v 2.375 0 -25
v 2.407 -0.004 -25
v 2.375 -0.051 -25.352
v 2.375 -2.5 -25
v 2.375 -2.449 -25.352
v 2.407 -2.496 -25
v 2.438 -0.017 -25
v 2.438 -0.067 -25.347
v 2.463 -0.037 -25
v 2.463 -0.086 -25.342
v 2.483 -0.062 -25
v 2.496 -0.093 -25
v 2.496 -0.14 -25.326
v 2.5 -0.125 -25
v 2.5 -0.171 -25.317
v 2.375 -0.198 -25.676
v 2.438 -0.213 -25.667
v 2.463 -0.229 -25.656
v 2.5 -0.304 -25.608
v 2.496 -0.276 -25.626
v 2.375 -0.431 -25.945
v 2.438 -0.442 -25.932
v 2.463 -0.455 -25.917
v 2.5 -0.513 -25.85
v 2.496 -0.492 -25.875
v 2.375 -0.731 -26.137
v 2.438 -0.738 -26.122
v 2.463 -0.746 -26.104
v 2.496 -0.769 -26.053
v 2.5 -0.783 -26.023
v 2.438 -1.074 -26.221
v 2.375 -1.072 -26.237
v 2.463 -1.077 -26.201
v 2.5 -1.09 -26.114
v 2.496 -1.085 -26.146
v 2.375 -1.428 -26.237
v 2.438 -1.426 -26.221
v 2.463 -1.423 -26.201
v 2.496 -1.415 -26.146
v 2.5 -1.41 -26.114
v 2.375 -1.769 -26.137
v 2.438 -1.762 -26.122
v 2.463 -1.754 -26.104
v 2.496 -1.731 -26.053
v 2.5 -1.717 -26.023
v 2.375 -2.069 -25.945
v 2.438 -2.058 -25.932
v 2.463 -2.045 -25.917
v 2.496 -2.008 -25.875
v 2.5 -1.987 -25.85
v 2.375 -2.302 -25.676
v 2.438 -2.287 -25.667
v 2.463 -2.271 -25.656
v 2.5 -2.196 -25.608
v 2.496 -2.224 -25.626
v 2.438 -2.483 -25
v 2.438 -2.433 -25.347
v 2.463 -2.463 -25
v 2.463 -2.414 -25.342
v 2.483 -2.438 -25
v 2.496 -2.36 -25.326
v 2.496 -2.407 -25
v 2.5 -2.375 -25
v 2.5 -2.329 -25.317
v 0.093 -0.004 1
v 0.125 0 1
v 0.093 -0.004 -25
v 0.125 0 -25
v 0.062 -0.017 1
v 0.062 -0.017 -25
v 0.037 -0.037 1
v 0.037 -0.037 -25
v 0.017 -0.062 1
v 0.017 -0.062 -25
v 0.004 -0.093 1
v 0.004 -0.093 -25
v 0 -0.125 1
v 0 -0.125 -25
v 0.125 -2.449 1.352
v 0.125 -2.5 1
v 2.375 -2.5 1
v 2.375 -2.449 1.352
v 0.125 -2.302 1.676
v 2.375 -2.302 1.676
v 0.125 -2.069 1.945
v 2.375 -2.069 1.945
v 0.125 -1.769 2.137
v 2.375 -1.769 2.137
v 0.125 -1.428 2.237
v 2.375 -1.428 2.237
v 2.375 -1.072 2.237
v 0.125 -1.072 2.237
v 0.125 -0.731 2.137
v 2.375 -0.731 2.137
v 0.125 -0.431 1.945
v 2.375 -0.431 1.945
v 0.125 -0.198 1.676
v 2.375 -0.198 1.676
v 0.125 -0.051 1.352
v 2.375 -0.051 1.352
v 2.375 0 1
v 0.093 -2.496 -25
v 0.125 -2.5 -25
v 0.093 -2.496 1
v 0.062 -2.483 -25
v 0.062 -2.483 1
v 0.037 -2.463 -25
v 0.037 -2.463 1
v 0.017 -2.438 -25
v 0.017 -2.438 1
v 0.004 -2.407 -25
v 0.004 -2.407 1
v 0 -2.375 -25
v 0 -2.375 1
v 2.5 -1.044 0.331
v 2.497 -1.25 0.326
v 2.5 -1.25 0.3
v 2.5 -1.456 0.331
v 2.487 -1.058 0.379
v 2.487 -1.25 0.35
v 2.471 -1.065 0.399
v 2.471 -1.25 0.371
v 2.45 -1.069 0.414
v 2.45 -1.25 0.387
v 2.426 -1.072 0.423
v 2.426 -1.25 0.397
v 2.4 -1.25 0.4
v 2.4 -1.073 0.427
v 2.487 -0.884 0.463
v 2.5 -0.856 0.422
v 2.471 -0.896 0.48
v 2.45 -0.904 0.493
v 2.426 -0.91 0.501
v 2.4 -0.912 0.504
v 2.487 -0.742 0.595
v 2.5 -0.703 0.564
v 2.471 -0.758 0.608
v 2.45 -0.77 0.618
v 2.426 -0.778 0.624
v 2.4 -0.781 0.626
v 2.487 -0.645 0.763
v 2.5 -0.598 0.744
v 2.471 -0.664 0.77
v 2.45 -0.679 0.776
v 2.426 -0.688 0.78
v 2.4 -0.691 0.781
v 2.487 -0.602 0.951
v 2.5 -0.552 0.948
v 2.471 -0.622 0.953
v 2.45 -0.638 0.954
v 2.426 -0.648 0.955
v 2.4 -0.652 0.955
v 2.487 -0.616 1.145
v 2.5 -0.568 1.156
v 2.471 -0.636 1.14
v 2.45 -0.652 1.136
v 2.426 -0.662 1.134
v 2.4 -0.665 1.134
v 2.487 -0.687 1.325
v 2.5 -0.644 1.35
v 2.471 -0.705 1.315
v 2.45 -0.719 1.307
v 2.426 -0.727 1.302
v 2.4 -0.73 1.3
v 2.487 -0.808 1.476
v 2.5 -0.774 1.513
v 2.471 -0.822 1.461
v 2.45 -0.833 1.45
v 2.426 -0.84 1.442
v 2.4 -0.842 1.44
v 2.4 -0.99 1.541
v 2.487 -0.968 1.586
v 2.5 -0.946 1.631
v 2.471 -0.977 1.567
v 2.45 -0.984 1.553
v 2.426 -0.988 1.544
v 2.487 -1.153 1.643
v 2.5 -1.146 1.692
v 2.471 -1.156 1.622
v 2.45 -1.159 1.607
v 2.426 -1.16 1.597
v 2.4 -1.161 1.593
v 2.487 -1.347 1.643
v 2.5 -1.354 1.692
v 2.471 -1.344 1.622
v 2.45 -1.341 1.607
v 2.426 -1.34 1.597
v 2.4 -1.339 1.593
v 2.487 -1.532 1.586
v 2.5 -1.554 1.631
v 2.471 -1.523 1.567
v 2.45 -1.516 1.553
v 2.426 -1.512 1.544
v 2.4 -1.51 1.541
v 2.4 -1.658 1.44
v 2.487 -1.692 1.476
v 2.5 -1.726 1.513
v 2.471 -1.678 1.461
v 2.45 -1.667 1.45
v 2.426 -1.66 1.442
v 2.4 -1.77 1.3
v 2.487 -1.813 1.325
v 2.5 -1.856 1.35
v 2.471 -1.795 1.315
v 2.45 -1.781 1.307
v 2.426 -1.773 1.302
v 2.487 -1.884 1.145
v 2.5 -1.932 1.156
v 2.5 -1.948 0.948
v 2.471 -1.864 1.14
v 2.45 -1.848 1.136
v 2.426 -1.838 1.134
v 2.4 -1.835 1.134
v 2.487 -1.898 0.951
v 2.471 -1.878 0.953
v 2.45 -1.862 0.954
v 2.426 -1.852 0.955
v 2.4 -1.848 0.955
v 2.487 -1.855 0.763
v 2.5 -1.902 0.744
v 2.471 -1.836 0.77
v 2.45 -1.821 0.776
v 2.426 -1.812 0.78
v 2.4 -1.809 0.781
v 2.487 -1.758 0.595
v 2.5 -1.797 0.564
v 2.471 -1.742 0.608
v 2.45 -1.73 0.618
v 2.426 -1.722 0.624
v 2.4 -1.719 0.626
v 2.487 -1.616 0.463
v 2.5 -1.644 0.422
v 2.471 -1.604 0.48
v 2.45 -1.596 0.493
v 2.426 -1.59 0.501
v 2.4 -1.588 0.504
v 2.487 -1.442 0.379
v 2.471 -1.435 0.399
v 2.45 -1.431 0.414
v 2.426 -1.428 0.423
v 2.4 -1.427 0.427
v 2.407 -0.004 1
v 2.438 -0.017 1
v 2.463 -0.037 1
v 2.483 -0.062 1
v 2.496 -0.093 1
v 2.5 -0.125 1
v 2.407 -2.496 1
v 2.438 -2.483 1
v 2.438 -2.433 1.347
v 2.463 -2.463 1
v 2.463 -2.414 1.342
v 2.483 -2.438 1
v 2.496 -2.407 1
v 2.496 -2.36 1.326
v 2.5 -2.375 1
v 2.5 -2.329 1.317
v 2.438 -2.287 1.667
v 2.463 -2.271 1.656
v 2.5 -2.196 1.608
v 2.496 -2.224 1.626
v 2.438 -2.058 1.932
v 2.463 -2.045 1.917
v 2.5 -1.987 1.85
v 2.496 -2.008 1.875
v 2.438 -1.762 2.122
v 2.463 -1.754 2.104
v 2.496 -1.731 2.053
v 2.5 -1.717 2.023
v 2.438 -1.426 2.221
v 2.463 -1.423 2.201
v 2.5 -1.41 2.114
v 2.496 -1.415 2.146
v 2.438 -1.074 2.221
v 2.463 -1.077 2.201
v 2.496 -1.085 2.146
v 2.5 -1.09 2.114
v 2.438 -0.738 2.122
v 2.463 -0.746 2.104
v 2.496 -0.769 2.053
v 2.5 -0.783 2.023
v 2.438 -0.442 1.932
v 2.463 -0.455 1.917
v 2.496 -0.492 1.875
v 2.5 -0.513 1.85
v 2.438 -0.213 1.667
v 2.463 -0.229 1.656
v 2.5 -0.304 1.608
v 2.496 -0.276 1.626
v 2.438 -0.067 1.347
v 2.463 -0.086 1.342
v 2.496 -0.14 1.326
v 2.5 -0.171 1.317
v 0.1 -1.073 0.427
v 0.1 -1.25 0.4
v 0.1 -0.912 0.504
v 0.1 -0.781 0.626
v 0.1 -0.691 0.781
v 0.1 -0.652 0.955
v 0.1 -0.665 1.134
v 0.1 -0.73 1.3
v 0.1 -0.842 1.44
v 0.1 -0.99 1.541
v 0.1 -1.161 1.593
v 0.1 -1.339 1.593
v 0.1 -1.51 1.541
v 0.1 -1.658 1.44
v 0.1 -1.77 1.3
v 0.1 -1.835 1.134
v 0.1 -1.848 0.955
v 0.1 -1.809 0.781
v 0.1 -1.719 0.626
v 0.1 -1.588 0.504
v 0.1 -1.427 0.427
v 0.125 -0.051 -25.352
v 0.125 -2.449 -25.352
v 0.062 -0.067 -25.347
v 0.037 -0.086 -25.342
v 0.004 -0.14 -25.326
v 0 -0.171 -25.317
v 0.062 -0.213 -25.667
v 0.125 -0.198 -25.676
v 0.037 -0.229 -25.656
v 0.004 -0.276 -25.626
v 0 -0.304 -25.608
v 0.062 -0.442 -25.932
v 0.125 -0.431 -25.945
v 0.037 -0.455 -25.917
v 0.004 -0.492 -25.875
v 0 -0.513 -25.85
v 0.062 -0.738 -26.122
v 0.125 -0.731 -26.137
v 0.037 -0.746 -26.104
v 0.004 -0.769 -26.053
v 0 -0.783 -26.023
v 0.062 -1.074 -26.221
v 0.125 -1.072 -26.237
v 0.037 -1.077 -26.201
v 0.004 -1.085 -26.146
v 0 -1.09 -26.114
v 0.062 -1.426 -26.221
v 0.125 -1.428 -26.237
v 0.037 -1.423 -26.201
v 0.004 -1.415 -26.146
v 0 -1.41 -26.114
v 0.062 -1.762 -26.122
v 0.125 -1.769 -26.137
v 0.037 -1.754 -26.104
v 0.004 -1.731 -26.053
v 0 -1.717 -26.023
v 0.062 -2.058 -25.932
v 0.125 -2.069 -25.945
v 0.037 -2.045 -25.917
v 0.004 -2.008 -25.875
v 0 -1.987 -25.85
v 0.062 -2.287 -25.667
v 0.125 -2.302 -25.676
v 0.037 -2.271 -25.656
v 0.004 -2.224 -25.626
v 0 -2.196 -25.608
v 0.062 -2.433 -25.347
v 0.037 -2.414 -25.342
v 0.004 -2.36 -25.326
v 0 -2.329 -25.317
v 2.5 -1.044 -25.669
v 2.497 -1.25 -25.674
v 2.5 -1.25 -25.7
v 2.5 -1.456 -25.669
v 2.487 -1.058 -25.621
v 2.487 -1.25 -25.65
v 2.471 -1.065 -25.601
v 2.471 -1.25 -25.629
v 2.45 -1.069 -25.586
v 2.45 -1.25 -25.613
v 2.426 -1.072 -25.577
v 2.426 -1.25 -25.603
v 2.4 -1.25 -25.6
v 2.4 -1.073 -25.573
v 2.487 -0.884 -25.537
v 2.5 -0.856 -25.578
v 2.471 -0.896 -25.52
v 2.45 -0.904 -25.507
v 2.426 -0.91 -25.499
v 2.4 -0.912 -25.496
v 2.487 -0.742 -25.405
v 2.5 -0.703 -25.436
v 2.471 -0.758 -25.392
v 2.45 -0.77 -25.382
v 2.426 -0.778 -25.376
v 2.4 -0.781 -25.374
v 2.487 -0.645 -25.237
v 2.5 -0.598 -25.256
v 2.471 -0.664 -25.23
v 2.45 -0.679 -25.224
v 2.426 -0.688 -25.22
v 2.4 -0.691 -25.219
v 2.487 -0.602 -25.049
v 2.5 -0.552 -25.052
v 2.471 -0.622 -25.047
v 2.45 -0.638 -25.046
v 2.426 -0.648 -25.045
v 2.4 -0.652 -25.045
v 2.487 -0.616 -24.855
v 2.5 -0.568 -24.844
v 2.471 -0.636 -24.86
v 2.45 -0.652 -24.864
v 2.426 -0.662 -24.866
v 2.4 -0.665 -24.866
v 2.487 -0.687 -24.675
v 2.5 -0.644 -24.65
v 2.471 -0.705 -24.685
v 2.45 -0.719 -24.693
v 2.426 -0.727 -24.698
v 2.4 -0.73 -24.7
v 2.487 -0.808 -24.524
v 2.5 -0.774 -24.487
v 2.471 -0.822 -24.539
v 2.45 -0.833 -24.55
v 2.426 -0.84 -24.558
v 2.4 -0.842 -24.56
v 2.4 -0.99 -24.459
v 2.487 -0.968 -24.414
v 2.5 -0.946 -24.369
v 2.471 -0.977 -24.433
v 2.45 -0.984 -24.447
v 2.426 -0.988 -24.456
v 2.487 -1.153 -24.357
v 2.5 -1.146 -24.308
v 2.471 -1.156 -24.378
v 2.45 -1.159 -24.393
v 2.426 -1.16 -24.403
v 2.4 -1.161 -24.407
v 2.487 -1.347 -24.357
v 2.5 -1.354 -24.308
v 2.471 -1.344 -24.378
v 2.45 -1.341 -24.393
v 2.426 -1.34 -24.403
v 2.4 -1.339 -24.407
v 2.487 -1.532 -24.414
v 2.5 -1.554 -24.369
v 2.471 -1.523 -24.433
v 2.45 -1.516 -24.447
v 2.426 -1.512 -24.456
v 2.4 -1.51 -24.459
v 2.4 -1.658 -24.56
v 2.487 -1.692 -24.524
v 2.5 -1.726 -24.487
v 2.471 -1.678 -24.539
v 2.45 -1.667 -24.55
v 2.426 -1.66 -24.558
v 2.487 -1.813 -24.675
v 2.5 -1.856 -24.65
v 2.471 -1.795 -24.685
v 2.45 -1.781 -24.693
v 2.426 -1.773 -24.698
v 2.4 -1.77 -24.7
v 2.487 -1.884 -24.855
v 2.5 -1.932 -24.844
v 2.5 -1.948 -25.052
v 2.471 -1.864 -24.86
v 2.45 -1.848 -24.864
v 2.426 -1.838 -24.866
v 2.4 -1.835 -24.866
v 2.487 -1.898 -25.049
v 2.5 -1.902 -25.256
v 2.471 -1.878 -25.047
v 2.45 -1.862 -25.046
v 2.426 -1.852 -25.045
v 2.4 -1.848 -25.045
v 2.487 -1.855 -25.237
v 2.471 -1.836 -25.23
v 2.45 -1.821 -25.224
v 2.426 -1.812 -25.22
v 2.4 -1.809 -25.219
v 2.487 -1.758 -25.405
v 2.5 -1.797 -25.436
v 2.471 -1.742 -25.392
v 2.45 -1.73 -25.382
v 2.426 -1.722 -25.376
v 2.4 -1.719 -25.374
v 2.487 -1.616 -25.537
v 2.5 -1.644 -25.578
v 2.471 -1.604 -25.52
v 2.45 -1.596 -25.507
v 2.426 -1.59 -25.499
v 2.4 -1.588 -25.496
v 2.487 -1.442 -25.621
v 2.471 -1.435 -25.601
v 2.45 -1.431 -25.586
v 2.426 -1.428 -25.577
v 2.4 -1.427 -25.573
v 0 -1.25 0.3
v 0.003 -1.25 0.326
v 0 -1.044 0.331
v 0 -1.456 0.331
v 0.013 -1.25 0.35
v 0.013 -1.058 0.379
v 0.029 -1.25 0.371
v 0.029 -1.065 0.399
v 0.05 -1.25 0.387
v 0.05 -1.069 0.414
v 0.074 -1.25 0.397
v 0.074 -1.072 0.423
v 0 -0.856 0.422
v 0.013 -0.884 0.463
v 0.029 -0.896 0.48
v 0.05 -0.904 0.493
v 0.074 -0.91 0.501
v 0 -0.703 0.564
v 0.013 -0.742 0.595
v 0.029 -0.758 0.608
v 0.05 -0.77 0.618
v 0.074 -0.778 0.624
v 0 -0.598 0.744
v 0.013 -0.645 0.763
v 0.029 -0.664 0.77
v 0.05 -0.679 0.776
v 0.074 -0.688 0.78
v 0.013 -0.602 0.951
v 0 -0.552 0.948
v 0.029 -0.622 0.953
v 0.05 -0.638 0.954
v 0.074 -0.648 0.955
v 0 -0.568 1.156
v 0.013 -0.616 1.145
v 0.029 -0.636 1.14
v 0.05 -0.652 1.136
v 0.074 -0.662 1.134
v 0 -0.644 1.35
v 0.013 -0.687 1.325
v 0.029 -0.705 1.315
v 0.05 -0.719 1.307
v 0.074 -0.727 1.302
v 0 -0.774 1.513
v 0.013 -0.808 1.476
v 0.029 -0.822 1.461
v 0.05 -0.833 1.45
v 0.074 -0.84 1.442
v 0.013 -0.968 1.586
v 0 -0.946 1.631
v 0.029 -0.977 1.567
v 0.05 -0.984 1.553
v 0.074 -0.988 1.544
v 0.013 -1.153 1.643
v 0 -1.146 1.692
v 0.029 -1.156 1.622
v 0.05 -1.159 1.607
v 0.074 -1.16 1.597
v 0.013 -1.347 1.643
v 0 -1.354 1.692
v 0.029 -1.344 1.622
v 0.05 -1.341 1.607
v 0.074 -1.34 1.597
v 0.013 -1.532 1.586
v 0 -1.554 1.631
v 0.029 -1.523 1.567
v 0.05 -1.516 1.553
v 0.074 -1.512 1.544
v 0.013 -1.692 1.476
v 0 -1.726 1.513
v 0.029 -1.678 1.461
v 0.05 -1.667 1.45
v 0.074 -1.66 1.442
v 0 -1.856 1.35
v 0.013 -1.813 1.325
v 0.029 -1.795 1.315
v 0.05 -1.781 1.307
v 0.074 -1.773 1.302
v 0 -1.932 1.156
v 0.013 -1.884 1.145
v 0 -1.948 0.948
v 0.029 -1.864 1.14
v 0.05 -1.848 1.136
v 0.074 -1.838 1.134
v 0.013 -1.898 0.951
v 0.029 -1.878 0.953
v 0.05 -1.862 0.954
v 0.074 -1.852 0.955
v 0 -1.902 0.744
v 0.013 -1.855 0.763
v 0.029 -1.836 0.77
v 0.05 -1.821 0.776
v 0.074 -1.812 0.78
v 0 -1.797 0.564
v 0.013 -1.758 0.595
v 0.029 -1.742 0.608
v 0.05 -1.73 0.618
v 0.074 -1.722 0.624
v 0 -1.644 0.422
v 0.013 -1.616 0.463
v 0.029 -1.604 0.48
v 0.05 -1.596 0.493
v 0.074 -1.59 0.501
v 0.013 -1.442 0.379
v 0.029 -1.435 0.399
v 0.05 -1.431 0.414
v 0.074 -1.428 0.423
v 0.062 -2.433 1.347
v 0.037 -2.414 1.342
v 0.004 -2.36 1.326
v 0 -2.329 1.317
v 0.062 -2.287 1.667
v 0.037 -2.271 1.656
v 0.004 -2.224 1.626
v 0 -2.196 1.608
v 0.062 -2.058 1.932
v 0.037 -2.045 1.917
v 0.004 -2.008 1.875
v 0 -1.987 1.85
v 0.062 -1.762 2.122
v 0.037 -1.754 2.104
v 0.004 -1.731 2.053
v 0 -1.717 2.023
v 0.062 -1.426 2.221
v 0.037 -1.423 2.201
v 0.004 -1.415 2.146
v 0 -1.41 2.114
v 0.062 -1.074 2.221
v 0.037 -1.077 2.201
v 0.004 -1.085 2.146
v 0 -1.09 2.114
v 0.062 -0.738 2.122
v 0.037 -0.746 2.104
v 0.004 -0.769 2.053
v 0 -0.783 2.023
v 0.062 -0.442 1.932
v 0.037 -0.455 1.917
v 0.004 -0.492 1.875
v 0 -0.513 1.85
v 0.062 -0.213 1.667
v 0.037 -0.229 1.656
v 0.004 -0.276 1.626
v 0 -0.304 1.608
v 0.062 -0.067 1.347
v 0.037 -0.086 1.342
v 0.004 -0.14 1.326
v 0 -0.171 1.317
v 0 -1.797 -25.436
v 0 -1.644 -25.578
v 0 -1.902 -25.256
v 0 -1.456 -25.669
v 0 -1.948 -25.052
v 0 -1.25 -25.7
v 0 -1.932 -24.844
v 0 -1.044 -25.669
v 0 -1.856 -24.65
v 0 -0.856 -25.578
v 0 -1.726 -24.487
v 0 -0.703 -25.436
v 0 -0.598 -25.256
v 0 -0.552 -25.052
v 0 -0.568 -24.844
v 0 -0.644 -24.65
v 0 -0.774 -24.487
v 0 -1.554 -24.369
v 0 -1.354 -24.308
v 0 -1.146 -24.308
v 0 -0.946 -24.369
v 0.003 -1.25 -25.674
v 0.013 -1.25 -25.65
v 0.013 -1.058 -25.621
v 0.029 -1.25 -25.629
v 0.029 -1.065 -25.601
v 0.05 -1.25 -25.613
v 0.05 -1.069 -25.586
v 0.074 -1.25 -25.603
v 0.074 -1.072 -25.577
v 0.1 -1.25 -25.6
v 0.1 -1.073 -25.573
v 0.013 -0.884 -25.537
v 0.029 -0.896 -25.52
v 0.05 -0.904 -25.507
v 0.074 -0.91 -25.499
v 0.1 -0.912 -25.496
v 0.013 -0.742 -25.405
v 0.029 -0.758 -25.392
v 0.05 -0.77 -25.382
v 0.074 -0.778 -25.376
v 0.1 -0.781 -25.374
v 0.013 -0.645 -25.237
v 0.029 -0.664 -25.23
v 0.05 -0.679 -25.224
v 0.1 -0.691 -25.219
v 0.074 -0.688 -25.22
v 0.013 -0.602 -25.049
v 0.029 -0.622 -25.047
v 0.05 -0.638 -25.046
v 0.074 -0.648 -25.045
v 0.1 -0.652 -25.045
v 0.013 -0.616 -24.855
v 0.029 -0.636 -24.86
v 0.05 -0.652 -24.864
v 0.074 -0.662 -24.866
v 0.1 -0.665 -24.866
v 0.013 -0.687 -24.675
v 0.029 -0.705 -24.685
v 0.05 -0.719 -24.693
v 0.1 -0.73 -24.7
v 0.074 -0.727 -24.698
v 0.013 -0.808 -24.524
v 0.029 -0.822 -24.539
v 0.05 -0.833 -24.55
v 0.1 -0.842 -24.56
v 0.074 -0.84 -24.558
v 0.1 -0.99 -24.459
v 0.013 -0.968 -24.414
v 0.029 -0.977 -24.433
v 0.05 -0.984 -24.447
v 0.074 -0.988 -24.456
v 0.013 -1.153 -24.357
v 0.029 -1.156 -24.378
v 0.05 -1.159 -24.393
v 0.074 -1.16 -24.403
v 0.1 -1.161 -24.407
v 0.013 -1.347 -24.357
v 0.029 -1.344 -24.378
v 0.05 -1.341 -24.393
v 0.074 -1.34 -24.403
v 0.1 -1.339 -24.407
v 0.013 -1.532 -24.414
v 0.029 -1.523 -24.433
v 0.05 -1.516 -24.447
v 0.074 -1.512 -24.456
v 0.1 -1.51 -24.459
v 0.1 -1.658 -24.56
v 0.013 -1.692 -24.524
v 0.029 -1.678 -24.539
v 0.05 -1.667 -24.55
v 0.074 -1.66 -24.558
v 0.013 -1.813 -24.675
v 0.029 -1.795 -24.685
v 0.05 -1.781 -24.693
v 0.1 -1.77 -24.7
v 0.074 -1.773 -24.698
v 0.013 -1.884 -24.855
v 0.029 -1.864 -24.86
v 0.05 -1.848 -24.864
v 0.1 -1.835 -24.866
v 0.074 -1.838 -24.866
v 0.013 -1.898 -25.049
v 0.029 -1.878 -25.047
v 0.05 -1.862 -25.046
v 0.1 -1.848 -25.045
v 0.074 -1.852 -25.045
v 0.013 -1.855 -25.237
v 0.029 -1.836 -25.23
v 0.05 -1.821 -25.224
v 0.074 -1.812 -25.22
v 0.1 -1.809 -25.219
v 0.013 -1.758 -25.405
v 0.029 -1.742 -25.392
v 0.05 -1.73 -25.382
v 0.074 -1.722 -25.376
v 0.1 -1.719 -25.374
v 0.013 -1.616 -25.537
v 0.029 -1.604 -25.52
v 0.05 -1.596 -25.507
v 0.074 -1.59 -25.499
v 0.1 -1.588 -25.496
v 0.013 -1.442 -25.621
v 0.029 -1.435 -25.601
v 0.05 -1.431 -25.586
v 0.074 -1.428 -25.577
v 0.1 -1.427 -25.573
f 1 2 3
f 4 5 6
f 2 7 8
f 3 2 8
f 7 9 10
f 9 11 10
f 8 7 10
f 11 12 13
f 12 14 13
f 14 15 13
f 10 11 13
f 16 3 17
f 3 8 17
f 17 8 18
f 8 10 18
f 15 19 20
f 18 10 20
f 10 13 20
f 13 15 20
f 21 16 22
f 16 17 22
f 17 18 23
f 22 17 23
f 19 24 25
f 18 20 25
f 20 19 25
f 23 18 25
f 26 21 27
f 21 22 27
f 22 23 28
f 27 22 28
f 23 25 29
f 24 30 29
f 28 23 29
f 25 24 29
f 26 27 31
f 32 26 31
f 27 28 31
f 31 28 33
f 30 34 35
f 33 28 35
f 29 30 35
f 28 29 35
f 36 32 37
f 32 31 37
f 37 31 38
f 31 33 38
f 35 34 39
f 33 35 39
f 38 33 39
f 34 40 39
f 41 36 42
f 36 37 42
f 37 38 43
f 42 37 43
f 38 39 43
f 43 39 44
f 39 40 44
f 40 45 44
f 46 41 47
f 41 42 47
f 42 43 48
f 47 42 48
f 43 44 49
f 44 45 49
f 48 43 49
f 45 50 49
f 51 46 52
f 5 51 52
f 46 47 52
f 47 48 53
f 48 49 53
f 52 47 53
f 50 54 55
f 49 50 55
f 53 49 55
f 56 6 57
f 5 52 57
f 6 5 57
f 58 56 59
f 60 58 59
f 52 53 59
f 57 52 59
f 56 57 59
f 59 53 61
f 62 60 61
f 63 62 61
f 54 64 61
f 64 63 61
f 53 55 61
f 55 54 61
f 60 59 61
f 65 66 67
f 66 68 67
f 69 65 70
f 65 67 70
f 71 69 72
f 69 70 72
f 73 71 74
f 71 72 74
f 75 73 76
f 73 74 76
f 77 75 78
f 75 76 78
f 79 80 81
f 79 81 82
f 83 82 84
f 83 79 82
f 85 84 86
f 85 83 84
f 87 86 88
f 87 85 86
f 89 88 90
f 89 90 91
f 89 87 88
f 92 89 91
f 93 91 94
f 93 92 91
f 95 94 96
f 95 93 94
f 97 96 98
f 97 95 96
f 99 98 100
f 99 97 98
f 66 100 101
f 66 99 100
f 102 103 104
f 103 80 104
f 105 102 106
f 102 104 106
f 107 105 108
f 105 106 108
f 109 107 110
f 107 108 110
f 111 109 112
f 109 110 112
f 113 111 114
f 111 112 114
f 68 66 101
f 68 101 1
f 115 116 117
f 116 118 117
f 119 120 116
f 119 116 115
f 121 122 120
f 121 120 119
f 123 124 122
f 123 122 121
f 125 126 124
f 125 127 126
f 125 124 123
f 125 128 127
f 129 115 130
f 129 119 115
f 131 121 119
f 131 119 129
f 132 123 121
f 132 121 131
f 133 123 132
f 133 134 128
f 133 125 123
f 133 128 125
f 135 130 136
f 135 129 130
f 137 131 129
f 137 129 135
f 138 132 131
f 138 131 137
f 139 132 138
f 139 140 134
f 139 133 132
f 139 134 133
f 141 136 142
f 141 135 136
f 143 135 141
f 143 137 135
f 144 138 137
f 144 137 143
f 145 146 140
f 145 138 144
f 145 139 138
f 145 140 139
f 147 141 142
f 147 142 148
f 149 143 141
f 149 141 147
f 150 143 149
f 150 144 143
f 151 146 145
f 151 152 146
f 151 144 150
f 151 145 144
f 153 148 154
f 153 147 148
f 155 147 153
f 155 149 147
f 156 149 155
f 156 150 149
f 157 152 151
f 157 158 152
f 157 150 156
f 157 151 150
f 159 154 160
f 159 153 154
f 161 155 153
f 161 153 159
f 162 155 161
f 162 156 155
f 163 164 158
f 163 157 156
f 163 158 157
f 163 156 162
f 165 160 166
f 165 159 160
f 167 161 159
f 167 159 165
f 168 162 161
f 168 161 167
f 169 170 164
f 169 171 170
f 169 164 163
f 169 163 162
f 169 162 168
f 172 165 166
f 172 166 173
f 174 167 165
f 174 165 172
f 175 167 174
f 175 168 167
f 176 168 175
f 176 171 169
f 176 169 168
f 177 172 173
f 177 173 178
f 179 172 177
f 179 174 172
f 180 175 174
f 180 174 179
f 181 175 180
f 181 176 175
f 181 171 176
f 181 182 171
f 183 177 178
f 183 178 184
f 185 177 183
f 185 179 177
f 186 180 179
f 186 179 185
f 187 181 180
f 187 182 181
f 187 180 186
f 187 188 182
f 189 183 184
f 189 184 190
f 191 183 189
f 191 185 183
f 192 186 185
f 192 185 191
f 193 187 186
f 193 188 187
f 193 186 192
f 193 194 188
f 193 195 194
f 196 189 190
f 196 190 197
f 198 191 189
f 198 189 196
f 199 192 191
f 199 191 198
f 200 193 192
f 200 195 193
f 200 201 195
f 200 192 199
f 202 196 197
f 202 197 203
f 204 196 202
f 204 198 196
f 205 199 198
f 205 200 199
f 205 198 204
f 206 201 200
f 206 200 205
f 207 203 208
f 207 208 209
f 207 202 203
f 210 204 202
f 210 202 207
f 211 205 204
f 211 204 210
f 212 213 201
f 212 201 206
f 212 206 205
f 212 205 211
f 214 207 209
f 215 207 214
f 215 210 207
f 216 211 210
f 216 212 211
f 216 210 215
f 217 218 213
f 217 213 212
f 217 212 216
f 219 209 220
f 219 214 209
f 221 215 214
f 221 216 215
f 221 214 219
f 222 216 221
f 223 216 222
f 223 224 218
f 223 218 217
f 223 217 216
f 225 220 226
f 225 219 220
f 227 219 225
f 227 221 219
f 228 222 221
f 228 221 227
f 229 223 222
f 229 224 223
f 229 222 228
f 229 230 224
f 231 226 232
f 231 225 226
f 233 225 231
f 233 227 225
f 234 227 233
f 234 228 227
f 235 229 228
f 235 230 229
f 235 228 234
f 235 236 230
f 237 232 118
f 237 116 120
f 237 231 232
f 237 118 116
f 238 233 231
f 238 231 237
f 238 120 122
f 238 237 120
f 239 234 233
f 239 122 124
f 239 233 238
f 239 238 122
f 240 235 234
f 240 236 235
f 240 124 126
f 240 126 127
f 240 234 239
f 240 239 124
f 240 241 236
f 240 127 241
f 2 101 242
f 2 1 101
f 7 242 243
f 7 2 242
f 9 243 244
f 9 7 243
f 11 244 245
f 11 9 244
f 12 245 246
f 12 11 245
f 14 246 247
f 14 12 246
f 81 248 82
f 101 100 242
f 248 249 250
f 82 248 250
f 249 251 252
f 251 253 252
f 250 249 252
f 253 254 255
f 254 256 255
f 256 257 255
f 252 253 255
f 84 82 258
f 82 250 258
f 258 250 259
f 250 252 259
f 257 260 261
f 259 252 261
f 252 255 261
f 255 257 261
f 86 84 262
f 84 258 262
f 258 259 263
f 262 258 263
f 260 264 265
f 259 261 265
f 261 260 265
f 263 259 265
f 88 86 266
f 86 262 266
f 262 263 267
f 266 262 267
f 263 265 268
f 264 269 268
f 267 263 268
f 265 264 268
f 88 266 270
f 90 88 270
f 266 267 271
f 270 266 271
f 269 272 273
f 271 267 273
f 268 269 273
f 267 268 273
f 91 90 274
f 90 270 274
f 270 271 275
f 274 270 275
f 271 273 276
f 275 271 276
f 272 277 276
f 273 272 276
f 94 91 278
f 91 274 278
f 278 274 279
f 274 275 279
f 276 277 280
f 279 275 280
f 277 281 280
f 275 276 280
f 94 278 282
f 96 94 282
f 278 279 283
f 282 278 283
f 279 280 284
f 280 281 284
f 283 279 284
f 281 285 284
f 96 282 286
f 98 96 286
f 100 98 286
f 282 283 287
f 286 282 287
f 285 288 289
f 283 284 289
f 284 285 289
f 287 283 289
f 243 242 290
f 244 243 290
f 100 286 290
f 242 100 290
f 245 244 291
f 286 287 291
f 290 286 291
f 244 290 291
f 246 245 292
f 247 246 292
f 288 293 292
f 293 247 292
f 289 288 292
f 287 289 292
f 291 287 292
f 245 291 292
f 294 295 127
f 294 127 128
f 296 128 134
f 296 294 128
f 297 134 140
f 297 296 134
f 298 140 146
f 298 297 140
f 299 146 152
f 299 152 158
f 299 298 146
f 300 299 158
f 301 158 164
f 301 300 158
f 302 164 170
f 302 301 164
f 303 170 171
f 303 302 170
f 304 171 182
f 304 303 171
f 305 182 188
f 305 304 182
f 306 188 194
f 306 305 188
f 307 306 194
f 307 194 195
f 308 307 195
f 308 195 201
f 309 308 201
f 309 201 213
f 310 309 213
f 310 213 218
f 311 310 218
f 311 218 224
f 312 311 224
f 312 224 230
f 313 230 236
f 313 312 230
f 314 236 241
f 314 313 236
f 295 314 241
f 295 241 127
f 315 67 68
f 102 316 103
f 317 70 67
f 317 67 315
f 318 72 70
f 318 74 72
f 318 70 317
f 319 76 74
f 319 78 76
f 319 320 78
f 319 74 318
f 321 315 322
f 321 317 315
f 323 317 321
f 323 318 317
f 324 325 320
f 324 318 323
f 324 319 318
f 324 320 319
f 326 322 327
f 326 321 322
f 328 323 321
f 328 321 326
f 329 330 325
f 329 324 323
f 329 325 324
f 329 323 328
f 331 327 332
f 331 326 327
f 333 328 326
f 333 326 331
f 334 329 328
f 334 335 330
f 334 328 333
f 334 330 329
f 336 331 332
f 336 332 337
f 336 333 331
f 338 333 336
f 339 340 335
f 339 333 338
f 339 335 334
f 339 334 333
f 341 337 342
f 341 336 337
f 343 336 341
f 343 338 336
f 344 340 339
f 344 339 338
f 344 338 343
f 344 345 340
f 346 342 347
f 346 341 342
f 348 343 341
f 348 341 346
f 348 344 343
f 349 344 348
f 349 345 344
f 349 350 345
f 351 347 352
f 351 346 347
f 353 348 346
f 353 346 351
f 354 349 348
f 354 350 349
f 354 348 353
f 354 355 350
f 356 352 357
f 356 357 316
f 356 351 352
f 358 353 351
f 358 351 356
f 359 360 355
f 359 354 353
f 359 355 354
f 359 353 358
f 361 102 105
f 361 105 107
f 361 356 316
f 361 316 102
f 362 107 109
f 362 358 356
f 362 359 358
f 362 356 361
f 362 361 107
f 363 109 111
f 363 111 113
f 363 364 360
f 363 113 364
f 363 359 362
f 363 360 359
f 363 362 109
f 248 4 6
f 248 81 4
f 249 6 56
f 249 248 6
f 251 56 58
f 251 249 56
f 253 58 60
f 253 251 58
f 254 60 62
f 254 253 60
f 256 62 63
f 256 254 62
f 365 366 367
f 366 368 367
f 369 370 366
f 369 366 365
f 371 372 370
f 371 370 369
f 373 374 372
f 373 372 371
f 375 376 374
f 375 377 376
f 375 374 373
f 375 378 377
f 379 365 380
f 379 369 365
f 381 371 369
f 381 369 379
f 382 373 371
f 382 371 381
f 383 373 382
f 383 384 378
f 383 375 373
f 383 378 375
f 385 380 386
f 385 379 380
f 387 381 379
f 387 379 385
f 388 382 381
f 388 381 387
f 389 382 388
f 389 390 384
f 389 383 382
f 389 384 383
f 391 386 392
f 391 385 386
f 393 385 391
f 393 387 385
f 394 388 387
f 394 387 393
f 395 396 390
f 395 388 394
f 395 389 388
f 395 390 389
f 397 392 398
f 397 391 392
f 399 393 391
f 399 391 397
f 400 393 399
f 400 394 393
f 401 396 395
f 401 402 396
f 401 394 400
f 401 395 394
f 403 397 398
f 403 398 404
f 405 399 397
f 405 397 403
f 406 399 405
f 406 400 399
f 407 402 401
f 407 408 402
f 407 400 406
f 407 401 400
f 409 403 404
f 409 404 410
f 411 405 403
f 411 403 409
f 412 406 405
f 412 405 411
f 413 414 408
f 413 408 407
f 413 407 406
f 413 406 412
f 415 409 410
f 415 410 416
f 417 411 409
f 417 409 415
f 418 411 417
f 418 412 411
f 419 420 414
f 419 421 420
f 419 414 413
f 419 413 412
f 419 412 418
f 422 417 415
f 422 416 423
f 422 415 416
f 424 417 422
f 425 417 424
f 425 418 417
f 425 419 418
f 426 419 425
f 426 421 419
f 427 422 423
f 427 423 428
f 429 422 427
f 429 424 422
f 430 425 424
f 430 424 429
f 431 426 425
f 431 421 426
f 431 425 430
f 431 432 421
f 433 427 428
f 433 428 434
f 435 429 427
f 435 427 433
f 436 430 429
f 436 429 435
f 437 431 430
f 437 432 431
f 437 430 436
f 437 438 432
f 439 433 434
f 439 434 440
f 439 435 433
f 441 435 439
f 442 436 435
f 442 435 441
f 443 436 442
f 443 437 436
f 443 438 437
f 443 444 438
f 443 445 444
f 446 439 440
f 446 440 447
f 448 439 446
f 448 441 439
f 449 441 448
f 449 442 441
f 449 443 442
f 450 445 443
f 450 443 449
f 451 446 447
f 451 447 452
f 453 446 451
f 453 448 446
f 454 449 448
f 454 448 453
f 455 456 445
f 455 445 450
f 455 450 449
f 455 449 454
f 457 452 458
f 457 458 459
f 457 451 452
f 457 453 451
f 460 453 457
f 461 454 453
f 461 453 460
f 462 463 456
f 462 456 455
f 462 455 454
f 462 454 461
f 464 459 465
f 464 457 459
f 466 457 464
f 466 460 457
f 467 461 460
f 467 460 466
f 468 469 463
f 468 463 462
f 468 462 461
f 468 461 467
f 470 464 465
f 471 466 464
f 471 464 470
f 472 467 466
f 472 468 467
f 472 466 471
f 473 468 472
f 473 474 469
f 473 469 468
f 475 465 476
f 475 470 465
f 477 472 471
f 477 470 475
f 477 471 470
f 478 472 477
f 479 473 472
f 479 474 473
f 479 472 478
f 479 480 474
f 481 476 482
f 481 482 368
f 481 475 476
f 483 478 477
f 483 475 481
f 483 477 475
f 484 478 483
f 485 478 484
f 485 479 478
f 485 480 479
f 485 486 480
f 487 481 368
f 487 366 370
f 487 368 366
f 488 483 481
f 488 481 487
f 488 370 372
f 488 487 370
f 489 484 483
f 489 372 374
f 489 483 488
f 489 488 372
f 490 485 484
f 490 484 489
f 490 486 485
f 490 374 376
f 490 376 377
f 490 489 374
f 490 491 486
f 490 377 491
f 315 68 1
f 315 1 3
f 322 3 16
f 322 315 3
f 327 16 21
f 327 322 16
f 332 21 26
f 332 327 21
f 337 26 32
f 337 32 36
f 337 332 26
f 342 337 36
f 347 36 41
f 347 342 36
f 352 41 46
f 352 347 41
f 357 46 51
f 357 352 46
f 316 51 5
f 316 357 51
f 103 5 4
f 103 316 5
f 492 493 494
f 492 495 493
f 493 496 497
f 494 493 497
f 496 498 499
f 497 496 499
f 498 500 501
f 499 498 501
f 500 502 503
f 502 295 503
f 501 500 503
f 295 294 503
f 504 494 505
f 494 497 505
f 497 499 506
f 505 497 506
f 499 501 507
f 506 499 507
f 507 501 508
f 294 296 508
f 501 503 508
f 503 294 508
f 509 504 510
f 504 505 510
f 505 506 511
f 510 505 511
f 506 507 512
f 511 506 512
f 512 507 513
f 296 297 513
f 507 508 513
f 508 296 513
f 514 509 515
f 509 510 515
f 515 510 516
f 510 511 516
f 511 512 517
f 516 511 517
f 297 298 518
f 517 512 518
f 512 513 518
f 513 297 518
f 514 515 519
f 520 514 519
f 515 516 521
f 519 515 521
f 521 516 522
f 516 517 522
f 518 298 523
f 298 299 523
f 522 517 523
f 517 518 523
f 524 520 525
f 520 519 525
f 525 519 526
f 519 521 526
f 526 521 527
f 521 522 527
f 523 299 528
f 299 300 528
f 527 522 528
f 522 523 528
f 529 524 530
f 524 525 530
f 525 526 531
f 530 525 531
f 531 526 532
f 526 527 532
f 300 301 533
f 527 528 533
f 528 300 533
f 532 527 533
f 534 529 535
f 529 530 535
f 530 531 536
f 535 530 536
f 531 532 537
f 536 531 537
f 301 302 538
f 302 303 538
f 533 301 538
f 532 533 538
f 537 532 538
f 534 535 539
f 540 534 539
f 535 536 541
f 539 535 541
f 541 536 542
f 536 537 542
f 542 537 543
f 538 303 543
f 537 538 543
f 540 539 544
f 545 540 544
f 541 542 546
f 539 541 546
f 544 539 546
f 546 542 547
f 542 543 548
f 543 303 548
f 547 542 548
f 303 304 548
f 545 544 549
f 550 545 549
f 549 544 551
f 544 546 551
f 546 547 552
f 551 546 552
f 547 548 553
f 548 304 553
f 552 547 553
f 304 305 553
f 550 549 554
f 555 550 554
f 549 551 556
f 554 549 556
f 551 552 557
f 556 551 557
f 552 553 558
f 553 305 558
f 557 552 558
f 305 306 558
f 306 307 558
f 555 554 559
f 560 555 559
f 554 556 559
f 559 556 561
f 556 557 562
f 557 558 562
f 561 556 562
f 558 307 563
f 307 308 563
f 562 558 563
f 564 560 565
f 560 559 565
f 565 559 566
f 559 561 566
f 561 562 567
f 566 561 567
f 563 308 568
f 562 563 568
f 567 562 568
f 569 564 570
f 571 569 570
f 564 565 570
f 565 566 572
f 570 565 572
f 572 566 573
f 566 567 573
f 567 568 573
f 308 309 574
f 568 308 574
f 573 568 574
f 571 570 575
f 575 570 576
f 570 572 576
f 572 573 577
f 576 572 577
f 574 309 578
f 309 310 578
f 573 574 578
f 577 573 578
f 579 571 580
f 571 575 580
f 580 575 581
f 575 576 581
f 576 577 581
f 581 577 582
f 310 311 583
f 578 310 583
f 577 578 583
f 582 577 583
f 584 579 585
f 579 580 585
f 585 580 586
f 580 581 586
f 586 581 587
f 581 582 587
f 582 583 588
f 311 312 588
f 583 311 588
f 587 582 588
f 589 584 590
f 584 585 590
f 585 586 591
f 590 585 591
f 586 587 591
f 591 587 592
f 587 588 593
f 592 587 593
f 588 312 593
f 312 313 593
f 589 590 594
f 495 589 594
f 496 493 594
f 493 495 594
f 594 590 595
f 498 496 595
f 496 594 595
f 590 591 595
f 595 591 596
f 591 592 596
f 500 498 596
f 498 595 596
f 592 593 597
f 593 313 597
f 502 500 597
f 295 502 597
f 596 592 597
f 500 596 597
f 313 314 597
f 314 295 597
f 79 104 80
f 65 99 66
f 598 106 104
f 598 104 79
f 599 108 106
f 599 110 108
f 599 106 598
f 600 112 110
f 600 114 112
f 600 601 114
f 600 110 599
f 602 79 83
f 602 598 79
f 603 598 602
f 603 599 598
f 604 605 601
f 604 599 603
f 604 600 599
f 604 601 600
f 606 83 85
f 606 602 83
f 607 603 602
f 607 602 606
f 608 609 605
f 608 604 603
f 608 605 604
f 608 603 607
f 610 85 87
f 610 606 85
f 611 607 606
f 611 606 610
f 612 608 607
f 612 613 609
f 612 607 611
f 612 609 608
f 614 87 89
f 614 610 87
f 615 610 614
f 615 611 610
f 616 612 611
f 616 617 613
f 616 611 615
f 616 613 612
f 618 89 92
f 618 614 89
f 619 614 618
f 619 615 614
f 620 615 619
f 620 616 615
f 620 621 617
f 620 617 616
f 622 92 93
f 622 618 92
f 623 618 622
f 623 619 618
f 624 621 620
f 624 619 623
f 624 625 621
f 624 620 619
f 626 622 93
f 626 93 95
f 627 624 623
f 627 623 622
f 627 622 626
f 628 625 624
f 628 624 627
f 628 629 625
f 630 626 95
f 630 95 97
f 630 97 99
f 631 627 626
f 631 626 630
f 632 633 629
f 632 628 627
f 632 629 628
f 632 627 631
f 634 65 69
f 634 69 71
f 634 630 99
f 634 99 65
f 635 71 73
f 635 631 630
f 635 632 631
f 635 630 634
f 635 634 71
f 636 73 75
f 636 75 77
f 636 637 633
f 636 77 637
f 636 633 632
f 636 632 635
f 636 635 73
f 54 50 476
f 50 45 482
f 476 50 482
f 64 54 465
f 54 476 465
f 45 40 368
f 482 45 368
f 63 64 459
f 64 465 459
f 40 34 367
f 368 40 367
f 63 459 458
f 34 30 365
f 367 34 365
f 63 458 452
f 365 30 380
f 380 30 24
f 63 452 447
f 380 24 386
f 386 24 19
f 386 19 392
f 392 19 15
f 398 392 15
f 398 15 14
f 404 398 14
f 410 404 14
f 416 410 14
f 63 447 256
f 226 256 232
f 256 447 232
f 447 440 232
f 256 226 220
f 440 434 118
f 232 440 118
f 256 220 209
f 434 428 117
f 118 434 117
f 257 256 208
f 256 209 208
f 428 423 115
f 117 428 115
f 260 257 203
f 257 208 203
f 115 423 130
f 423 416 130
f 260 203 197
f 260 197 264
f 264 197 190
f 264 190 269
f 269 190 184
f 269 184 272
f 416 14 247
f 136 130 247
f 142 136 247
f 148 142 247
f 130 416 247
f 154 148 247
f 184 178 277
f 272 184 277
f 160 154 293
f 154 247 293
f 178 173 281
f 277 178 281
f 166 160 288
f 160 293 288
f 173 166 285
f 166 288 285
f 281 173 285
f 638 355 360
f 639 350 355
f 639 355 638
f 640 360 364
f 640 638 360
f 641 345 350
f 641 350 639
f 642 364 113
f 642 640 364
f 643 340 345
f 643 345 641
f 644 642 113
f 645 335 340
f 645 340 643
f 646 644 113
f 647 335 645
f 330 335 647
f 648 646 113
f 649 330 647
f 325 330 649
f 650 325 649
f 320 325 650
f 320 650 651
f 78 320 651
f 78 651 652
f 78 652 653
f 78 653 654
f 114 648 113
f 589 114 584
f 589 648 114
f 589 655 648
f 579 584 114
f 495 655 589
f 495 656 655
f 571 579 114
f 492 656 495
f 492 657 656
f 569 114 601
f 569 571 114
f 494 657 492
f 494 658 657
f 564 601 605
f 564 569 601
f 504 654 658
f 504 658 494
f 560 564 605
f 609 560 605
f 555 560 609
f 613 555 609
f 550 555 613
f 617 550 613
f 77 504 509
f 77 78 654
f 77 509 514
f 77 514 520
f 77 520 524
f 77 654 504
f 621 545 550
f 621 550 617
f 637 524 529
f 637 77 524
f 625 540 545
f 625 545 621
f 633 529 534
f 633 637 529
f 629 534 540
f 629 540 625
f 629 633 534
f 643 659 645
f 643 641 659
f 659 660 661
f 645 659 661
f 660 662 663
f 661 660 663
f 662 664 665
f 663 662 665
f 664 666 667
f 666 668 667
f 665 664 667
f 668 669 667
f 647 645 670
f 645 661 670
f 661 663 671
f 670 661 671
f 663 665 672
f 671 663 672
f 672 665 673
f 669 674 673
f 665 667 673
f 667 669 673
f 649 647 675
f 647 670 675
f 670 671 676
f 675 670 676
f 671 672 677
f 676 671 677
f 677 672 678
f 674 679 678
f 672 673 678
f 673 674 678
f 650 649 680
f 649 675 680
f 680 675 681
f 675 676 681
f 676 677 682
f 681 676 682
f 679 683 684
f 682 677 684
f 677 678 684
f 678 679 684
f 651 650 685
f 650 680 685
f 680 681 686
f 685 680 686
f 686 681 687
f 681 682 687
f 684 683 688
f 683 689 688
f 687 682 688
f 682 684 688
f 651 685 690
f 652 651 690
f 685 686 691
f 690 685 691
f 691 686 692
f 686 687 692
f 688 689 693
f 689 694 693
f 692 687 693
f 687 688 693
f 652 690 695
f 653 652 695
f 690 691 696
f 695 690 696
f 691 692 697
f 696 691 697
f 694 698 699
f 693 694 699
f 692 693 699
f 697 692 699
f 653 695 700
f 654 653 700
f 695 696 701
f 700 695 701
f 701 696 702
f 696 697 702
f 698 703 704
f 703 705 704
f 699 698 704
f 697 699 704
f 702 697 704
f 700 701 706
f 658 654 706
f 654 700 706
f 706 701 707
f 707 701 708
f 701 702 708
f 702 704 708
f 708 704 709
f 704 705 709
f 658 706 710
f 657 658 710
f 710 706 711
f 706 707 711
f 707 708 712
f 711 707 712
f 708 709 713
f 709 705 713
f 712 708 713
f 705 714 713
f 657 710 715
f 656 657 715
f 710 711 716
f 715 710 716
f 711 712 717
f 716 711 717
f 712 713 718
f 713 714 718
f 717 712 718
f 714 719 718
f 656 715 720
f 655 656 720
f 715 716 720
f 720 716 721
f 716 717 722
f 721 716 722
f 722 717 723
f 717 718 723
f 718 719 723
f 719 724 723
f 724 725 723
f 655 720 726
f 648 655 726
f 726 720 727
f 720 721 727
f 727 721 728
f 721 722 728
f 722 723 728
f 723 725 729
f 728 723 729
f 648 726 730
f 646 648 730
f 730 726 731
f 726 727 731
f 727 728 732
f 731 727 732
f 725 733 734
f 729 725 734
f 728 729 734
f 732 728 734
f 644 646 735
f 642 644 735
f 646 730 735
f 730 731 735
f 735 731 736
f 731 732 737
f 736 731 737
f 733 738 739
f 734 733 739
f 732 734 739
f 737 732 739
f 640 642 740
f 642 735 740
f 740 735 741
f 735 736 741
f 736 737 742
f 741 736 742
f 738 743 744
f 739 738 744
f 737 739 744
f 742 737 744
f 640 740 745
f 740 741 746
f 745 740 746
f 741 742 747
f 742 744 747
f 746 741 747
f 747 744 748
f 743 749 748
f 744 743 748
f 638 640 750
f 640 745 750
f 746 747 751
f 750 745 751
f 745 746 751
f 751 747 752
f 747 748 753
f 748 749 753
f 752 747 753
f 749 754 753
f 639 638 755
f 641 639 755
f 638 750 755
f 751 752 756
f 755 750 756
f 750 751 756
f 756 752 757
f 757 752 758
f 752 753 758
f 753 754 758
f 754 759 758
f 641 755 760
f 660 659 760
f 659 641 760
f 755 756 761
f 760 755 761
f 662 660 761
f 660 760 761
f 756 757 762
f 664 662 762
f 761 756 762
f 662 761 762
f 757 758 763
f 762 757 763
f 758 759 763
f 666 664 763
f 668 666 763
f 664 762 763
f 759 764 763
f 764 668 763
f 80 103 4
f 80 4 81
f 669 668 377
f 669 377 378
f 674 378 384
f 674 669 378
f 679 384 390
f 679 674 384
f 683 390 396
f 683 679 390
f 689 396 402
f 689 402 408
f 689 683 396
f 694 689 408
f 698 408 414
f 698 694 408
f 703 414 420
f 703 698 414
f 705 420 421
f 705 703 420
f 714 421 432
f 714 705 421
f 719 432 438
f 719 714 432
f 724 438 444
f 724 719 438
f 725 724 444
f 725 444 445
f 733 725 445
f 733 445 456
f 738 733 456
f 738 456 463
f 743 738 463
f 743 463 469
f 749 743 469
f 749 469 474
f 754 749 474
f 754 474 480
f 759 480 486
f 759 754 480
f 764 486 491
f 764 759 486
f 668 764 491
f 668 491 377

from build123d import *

# Parameters (mm, degrees)
SKETCH1_R           = 0.6
BOSS_EXTRUDE1_DEPTH = 2.5
FILLET1_R           = 0.125
FILLET2_R           = 0.1


with BuildPart() as part:
    # Sketch1 → Boss-Extrude1 (new body)
    with BuildSketch(Plane(origin=(0, 0, 0), x_dir=(0, 0, -1), z_dir=(1, 0, 0))):
        with BuildLine():
            ThreePointArc((25, 0), (26.25, -1.25), (25, -2.5))
            Line((25, -2.5), (24, -2.5))
            Line((24, -2.5), (0, -2.5))
            Line((0, -2.5), (-1, -2.5))
            ThreePointArc((-1, -2.5), (-2.25, -1.25), (-1, 0))
            Line((-1, 0), (0, 0))
            Line((0, 0), (24, 0))
            Line((24, 0), (25, 0))
        make_face()
        with Locations((25, -1.25)):
            Circle(SKETCH1_R, mode=Mode.SUBTRACT)
        with Locations((-1, -1.25)):
            Circle(SKETCH1_R, mode=Mode.SUBTRACT)
    extrude(amount=BOSS_EXTRUDE1_DEPTH)

    # Fillet1
    fillet1_edges = [part.edges().sort_by_distance(p)[0] for p in [
        (0, -1.25, 2.25),
        (0, 0, -12),
        (0, -1.25, -26.25),
        (2.5, 0, -12),
        (2.5, -1.25, 2.25),
        (2.5, -2.5, -12),
        (2.5, -1.25, -26.25),
        (0, -2.5, -12),
    ]]
    fillet(fillet1_edges, radius=FILLET1_R)

    # Fillet2
    fillet2_edges = [part.edges().sort_by_distance(p)[0] for p in [
        (2.5, -1.25, -24.4),
        (2.5, -1.25, 1.6),
        (0, -1.25, 1.6),
        (0, -1.25, -24.4),
    ]]
    fillet(fillet2_edges, radius=FILLET2_R)


solid = part.part
